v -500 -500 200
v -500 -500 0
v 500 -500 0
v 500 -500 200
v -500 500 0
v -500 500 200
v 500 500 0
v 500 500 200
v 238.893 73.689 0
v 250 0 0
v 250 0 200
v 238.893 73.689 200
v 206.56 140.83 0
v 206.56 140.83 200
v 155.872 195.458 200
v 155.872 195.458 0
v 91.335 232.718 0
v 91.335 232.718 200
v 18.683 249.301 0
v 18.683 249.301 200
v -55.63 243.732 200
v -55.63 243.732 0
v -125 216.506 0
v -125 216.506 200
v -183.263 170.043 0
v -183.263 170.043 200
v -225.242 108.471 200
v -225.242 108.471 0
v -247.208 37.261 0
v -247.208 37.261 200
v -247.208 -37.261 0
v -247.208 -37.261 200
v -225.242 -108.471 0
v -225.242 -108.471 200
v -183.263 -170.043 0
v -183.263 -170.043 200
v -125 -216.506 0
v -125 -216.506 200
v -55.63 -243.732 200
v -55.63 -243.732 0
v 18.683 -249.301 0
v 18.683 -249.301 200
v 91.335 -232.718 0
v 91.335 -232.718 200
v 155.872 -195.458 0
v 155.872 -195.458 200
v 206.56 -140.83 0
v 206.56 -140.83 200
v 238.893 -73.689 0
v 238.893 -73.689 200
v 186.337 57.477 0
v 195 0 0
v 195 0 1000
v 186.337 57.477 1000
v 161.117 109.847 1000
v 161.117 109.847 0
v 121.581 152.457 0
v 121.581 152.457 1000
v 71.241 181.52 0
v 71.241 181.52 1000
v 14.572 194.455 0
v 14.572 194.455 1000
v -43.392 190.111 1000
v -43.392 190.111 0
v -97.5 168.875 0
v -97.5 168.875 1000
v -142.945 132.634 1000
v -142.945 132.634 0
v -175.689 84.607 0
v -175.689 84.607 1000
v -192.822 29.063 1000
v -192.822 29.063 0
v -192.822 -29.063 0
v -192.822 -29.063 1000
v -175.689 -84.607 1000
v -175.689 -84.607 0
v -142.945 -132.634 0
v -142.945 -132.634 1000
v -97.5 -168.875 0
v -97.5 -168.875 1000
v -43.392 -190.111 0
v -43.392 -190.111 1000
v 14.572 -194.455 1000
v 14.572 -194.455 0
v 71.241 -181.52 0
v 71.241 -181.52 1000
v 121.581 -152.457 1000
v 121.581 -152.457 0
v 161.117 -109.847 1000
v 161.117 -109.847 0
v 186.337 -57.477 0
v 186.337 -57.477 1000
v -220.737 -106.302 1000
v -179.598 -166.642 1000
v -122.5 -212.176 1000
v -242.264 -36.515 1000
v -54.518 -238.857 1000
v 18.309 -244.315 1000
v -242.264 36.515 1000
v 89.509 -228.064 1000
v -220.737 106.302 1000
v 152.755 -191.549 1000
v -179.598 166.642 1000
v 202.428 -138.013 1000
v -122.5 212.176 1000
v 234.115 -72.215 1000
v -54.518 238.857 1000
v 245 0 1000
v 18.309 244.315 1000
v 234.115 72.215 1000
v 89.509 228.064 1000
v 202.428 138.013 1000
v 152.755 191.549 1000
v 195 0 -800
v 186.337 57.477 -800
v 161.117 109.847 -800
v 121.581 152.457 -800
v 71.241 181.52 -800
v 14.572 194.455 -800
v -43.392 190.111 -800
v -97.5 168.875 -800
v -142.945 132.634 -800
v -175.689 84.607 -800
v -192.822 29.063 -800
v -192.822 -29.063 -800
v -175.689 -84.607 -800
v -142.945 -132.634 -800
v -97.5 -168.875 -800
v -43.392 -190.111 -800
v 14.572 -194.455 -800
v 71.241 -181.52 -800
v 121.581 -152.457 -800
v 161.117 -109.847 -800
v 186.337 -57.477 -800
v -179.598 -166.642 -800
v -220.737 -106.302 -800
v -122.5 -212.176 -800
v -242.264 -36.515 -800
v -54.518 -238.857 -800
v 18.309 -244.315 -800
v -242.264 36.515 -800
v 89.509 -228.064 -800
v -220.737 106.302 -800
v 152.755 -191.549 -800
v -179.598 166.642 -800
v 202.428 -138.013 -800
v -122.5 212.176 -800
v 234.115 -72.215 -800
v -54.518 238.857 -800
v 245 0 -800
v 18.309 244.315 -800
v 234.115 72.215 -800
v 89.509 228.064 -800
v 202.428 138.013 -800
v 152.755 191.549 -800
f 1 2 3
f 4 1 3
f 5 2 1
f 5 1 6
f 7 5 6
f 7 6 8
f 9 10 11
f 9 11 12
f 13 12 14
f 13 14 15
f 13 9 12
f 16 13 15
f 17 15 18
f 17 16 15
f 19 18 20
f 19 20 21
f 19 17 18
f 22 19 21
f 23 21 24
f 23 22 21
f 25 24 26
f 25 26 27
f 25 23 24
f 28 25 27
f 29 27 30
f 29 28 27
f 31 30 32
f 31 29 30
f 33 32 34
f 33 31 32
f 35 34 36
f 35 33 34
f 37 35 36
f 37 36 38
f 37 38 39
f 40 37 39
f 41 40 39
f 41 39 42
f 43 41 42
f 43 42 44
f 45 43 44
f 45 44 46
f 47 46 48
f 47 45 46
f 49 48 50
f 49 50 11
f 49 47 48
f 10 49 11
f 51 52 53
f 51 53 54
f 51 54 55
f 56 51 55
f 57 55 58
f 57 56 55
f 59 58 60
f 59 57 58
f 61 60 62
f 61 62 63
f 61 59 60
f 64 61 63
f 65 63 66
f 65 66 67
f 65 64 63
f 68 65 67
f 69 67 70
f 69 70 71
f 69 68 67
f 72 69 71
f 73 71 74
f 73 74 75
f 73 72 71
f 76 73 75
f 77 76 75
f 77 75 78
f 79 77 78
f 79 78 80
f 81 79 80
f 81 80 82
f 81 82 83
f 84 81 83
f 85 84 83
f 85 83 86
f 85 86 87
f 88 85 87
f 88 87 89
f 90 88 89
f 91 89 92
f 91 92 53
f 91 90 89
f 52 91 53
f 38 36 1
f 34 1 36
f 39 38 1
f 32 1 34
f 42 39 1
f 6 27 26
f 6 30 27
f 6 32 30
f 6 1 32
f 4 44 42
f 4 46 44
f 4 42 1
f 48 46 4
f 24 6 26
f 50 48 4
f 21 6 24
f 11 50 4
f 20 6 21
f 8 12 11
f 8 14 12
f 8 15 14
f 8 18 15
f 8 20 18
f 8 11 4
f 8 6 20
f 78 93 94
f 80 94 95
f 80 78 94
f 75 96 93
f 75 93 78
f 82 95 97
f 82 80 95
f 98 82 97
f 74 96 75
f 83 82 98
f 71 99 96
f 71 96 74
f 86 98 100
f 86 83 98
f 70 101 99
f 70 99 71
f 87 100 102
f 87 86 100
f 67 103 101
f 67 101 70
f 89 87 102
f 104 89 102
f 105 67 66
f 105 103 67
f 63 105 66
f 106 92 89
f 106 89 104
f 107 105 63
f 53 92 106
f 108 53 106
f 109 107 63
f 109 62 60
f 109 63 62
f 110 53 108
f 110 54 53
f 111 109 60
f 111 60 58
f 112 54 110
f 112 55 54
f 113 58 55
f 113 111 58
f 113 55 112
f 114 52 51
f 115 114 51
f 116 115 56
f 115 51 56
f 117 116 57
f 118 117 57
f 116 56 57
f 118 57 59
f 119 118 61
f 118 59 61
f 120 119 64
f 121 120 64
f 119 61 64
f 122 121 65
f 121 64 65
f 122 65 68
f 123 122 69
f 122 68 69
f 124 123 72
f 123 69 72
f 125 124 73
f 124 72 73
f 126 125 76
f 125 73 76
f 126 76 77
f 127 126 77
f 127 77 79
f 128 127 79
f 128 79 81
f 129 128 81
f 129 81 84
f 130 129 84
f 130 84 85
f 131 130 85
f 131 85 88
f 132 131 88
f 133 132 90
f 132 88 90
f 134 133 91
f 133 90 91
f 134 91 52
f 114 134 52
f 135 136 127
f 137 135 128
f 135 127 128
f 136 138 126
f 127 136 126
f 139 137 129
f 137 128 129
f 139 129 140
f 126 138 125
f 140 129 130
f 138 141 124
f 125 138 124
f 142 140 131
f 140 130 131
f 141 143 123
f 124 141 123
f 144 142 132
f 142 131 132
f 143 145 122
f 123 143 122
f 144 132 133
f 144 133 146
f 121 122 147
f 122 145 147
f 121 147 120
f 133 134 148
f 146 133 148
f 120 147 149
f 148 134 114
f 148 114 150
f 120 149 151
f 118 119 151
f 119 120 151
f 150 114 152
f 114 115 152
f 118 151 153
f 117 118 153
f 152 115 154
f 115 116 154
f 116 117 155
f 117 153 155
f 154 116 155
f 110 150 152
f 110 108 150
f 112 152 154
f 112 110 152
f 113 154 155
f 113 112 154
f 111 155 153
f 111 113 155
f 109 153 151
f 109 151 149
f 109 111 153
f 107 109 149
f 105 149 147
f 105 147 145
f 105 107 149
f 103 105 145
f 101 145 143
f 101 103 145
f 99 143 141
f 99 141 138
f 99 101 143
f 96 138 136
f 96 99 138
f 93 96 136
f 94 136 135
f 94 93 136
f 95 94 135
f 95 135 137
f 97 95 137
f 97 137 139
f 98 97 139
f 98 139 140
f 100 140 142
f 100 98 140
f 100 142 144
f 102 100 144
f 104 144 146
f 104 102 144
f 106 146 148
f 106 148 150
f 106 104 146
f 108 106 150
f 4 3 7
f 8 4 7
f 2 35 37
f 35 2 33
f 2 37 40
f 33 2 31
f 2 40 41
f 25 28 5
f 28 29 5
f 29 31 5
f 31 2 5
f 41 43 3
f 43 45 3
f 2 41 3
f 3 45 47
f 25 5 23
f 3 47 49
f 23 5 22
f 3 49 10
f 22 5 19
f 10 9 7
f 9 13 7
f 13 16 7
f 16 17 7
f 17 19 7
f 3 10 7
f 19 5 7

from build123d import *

# Parameters (mm, degrees)
SKETCH1_W                = 1000
SKETCH1_H                = 1000
SKETCH1_R                = 250
BOSS_EXTRUDE1_DEPTH      = 200
SKETCH2_R                = 245
SKETCH2_R_2              = 195
EXTRUDE_THIN1_DEPTH      = 1000
EXTRUDE_THIN1_DEPTH_BACK = 800


with BuildPart() as part:
    # Sketch1 → Boss-Extrude1 (new body)
    with BuildSketch(Plane.XY):
        Rectangle(SKETCH1_W, SKETCH1_H)
        Circle(SKETCH1_R, mode=Mode.SUBTRACT)
    extrude(amount=BOSS_EXTRUDE1_DEPTH)


with BuildPart() as body_2:
    # Sketch2 → Extrude-Thin1 (new body, two sides)
    with BuildSketch(Plane.XY) as extrude_thin1_sk:
        Circle(SKETCH2_R)
        Circle(SKETCH2_R_2, mode=Mode.SUBTRACT)
    extrude(amount=EXTRUDE_THIN1_DEPTH)
    extrude(extrude_thin1_sk.sketch, amount=-EXTRUDE_THIN1_DEPTH_BACK)


solid = Compound([part.part, body_2.part])
